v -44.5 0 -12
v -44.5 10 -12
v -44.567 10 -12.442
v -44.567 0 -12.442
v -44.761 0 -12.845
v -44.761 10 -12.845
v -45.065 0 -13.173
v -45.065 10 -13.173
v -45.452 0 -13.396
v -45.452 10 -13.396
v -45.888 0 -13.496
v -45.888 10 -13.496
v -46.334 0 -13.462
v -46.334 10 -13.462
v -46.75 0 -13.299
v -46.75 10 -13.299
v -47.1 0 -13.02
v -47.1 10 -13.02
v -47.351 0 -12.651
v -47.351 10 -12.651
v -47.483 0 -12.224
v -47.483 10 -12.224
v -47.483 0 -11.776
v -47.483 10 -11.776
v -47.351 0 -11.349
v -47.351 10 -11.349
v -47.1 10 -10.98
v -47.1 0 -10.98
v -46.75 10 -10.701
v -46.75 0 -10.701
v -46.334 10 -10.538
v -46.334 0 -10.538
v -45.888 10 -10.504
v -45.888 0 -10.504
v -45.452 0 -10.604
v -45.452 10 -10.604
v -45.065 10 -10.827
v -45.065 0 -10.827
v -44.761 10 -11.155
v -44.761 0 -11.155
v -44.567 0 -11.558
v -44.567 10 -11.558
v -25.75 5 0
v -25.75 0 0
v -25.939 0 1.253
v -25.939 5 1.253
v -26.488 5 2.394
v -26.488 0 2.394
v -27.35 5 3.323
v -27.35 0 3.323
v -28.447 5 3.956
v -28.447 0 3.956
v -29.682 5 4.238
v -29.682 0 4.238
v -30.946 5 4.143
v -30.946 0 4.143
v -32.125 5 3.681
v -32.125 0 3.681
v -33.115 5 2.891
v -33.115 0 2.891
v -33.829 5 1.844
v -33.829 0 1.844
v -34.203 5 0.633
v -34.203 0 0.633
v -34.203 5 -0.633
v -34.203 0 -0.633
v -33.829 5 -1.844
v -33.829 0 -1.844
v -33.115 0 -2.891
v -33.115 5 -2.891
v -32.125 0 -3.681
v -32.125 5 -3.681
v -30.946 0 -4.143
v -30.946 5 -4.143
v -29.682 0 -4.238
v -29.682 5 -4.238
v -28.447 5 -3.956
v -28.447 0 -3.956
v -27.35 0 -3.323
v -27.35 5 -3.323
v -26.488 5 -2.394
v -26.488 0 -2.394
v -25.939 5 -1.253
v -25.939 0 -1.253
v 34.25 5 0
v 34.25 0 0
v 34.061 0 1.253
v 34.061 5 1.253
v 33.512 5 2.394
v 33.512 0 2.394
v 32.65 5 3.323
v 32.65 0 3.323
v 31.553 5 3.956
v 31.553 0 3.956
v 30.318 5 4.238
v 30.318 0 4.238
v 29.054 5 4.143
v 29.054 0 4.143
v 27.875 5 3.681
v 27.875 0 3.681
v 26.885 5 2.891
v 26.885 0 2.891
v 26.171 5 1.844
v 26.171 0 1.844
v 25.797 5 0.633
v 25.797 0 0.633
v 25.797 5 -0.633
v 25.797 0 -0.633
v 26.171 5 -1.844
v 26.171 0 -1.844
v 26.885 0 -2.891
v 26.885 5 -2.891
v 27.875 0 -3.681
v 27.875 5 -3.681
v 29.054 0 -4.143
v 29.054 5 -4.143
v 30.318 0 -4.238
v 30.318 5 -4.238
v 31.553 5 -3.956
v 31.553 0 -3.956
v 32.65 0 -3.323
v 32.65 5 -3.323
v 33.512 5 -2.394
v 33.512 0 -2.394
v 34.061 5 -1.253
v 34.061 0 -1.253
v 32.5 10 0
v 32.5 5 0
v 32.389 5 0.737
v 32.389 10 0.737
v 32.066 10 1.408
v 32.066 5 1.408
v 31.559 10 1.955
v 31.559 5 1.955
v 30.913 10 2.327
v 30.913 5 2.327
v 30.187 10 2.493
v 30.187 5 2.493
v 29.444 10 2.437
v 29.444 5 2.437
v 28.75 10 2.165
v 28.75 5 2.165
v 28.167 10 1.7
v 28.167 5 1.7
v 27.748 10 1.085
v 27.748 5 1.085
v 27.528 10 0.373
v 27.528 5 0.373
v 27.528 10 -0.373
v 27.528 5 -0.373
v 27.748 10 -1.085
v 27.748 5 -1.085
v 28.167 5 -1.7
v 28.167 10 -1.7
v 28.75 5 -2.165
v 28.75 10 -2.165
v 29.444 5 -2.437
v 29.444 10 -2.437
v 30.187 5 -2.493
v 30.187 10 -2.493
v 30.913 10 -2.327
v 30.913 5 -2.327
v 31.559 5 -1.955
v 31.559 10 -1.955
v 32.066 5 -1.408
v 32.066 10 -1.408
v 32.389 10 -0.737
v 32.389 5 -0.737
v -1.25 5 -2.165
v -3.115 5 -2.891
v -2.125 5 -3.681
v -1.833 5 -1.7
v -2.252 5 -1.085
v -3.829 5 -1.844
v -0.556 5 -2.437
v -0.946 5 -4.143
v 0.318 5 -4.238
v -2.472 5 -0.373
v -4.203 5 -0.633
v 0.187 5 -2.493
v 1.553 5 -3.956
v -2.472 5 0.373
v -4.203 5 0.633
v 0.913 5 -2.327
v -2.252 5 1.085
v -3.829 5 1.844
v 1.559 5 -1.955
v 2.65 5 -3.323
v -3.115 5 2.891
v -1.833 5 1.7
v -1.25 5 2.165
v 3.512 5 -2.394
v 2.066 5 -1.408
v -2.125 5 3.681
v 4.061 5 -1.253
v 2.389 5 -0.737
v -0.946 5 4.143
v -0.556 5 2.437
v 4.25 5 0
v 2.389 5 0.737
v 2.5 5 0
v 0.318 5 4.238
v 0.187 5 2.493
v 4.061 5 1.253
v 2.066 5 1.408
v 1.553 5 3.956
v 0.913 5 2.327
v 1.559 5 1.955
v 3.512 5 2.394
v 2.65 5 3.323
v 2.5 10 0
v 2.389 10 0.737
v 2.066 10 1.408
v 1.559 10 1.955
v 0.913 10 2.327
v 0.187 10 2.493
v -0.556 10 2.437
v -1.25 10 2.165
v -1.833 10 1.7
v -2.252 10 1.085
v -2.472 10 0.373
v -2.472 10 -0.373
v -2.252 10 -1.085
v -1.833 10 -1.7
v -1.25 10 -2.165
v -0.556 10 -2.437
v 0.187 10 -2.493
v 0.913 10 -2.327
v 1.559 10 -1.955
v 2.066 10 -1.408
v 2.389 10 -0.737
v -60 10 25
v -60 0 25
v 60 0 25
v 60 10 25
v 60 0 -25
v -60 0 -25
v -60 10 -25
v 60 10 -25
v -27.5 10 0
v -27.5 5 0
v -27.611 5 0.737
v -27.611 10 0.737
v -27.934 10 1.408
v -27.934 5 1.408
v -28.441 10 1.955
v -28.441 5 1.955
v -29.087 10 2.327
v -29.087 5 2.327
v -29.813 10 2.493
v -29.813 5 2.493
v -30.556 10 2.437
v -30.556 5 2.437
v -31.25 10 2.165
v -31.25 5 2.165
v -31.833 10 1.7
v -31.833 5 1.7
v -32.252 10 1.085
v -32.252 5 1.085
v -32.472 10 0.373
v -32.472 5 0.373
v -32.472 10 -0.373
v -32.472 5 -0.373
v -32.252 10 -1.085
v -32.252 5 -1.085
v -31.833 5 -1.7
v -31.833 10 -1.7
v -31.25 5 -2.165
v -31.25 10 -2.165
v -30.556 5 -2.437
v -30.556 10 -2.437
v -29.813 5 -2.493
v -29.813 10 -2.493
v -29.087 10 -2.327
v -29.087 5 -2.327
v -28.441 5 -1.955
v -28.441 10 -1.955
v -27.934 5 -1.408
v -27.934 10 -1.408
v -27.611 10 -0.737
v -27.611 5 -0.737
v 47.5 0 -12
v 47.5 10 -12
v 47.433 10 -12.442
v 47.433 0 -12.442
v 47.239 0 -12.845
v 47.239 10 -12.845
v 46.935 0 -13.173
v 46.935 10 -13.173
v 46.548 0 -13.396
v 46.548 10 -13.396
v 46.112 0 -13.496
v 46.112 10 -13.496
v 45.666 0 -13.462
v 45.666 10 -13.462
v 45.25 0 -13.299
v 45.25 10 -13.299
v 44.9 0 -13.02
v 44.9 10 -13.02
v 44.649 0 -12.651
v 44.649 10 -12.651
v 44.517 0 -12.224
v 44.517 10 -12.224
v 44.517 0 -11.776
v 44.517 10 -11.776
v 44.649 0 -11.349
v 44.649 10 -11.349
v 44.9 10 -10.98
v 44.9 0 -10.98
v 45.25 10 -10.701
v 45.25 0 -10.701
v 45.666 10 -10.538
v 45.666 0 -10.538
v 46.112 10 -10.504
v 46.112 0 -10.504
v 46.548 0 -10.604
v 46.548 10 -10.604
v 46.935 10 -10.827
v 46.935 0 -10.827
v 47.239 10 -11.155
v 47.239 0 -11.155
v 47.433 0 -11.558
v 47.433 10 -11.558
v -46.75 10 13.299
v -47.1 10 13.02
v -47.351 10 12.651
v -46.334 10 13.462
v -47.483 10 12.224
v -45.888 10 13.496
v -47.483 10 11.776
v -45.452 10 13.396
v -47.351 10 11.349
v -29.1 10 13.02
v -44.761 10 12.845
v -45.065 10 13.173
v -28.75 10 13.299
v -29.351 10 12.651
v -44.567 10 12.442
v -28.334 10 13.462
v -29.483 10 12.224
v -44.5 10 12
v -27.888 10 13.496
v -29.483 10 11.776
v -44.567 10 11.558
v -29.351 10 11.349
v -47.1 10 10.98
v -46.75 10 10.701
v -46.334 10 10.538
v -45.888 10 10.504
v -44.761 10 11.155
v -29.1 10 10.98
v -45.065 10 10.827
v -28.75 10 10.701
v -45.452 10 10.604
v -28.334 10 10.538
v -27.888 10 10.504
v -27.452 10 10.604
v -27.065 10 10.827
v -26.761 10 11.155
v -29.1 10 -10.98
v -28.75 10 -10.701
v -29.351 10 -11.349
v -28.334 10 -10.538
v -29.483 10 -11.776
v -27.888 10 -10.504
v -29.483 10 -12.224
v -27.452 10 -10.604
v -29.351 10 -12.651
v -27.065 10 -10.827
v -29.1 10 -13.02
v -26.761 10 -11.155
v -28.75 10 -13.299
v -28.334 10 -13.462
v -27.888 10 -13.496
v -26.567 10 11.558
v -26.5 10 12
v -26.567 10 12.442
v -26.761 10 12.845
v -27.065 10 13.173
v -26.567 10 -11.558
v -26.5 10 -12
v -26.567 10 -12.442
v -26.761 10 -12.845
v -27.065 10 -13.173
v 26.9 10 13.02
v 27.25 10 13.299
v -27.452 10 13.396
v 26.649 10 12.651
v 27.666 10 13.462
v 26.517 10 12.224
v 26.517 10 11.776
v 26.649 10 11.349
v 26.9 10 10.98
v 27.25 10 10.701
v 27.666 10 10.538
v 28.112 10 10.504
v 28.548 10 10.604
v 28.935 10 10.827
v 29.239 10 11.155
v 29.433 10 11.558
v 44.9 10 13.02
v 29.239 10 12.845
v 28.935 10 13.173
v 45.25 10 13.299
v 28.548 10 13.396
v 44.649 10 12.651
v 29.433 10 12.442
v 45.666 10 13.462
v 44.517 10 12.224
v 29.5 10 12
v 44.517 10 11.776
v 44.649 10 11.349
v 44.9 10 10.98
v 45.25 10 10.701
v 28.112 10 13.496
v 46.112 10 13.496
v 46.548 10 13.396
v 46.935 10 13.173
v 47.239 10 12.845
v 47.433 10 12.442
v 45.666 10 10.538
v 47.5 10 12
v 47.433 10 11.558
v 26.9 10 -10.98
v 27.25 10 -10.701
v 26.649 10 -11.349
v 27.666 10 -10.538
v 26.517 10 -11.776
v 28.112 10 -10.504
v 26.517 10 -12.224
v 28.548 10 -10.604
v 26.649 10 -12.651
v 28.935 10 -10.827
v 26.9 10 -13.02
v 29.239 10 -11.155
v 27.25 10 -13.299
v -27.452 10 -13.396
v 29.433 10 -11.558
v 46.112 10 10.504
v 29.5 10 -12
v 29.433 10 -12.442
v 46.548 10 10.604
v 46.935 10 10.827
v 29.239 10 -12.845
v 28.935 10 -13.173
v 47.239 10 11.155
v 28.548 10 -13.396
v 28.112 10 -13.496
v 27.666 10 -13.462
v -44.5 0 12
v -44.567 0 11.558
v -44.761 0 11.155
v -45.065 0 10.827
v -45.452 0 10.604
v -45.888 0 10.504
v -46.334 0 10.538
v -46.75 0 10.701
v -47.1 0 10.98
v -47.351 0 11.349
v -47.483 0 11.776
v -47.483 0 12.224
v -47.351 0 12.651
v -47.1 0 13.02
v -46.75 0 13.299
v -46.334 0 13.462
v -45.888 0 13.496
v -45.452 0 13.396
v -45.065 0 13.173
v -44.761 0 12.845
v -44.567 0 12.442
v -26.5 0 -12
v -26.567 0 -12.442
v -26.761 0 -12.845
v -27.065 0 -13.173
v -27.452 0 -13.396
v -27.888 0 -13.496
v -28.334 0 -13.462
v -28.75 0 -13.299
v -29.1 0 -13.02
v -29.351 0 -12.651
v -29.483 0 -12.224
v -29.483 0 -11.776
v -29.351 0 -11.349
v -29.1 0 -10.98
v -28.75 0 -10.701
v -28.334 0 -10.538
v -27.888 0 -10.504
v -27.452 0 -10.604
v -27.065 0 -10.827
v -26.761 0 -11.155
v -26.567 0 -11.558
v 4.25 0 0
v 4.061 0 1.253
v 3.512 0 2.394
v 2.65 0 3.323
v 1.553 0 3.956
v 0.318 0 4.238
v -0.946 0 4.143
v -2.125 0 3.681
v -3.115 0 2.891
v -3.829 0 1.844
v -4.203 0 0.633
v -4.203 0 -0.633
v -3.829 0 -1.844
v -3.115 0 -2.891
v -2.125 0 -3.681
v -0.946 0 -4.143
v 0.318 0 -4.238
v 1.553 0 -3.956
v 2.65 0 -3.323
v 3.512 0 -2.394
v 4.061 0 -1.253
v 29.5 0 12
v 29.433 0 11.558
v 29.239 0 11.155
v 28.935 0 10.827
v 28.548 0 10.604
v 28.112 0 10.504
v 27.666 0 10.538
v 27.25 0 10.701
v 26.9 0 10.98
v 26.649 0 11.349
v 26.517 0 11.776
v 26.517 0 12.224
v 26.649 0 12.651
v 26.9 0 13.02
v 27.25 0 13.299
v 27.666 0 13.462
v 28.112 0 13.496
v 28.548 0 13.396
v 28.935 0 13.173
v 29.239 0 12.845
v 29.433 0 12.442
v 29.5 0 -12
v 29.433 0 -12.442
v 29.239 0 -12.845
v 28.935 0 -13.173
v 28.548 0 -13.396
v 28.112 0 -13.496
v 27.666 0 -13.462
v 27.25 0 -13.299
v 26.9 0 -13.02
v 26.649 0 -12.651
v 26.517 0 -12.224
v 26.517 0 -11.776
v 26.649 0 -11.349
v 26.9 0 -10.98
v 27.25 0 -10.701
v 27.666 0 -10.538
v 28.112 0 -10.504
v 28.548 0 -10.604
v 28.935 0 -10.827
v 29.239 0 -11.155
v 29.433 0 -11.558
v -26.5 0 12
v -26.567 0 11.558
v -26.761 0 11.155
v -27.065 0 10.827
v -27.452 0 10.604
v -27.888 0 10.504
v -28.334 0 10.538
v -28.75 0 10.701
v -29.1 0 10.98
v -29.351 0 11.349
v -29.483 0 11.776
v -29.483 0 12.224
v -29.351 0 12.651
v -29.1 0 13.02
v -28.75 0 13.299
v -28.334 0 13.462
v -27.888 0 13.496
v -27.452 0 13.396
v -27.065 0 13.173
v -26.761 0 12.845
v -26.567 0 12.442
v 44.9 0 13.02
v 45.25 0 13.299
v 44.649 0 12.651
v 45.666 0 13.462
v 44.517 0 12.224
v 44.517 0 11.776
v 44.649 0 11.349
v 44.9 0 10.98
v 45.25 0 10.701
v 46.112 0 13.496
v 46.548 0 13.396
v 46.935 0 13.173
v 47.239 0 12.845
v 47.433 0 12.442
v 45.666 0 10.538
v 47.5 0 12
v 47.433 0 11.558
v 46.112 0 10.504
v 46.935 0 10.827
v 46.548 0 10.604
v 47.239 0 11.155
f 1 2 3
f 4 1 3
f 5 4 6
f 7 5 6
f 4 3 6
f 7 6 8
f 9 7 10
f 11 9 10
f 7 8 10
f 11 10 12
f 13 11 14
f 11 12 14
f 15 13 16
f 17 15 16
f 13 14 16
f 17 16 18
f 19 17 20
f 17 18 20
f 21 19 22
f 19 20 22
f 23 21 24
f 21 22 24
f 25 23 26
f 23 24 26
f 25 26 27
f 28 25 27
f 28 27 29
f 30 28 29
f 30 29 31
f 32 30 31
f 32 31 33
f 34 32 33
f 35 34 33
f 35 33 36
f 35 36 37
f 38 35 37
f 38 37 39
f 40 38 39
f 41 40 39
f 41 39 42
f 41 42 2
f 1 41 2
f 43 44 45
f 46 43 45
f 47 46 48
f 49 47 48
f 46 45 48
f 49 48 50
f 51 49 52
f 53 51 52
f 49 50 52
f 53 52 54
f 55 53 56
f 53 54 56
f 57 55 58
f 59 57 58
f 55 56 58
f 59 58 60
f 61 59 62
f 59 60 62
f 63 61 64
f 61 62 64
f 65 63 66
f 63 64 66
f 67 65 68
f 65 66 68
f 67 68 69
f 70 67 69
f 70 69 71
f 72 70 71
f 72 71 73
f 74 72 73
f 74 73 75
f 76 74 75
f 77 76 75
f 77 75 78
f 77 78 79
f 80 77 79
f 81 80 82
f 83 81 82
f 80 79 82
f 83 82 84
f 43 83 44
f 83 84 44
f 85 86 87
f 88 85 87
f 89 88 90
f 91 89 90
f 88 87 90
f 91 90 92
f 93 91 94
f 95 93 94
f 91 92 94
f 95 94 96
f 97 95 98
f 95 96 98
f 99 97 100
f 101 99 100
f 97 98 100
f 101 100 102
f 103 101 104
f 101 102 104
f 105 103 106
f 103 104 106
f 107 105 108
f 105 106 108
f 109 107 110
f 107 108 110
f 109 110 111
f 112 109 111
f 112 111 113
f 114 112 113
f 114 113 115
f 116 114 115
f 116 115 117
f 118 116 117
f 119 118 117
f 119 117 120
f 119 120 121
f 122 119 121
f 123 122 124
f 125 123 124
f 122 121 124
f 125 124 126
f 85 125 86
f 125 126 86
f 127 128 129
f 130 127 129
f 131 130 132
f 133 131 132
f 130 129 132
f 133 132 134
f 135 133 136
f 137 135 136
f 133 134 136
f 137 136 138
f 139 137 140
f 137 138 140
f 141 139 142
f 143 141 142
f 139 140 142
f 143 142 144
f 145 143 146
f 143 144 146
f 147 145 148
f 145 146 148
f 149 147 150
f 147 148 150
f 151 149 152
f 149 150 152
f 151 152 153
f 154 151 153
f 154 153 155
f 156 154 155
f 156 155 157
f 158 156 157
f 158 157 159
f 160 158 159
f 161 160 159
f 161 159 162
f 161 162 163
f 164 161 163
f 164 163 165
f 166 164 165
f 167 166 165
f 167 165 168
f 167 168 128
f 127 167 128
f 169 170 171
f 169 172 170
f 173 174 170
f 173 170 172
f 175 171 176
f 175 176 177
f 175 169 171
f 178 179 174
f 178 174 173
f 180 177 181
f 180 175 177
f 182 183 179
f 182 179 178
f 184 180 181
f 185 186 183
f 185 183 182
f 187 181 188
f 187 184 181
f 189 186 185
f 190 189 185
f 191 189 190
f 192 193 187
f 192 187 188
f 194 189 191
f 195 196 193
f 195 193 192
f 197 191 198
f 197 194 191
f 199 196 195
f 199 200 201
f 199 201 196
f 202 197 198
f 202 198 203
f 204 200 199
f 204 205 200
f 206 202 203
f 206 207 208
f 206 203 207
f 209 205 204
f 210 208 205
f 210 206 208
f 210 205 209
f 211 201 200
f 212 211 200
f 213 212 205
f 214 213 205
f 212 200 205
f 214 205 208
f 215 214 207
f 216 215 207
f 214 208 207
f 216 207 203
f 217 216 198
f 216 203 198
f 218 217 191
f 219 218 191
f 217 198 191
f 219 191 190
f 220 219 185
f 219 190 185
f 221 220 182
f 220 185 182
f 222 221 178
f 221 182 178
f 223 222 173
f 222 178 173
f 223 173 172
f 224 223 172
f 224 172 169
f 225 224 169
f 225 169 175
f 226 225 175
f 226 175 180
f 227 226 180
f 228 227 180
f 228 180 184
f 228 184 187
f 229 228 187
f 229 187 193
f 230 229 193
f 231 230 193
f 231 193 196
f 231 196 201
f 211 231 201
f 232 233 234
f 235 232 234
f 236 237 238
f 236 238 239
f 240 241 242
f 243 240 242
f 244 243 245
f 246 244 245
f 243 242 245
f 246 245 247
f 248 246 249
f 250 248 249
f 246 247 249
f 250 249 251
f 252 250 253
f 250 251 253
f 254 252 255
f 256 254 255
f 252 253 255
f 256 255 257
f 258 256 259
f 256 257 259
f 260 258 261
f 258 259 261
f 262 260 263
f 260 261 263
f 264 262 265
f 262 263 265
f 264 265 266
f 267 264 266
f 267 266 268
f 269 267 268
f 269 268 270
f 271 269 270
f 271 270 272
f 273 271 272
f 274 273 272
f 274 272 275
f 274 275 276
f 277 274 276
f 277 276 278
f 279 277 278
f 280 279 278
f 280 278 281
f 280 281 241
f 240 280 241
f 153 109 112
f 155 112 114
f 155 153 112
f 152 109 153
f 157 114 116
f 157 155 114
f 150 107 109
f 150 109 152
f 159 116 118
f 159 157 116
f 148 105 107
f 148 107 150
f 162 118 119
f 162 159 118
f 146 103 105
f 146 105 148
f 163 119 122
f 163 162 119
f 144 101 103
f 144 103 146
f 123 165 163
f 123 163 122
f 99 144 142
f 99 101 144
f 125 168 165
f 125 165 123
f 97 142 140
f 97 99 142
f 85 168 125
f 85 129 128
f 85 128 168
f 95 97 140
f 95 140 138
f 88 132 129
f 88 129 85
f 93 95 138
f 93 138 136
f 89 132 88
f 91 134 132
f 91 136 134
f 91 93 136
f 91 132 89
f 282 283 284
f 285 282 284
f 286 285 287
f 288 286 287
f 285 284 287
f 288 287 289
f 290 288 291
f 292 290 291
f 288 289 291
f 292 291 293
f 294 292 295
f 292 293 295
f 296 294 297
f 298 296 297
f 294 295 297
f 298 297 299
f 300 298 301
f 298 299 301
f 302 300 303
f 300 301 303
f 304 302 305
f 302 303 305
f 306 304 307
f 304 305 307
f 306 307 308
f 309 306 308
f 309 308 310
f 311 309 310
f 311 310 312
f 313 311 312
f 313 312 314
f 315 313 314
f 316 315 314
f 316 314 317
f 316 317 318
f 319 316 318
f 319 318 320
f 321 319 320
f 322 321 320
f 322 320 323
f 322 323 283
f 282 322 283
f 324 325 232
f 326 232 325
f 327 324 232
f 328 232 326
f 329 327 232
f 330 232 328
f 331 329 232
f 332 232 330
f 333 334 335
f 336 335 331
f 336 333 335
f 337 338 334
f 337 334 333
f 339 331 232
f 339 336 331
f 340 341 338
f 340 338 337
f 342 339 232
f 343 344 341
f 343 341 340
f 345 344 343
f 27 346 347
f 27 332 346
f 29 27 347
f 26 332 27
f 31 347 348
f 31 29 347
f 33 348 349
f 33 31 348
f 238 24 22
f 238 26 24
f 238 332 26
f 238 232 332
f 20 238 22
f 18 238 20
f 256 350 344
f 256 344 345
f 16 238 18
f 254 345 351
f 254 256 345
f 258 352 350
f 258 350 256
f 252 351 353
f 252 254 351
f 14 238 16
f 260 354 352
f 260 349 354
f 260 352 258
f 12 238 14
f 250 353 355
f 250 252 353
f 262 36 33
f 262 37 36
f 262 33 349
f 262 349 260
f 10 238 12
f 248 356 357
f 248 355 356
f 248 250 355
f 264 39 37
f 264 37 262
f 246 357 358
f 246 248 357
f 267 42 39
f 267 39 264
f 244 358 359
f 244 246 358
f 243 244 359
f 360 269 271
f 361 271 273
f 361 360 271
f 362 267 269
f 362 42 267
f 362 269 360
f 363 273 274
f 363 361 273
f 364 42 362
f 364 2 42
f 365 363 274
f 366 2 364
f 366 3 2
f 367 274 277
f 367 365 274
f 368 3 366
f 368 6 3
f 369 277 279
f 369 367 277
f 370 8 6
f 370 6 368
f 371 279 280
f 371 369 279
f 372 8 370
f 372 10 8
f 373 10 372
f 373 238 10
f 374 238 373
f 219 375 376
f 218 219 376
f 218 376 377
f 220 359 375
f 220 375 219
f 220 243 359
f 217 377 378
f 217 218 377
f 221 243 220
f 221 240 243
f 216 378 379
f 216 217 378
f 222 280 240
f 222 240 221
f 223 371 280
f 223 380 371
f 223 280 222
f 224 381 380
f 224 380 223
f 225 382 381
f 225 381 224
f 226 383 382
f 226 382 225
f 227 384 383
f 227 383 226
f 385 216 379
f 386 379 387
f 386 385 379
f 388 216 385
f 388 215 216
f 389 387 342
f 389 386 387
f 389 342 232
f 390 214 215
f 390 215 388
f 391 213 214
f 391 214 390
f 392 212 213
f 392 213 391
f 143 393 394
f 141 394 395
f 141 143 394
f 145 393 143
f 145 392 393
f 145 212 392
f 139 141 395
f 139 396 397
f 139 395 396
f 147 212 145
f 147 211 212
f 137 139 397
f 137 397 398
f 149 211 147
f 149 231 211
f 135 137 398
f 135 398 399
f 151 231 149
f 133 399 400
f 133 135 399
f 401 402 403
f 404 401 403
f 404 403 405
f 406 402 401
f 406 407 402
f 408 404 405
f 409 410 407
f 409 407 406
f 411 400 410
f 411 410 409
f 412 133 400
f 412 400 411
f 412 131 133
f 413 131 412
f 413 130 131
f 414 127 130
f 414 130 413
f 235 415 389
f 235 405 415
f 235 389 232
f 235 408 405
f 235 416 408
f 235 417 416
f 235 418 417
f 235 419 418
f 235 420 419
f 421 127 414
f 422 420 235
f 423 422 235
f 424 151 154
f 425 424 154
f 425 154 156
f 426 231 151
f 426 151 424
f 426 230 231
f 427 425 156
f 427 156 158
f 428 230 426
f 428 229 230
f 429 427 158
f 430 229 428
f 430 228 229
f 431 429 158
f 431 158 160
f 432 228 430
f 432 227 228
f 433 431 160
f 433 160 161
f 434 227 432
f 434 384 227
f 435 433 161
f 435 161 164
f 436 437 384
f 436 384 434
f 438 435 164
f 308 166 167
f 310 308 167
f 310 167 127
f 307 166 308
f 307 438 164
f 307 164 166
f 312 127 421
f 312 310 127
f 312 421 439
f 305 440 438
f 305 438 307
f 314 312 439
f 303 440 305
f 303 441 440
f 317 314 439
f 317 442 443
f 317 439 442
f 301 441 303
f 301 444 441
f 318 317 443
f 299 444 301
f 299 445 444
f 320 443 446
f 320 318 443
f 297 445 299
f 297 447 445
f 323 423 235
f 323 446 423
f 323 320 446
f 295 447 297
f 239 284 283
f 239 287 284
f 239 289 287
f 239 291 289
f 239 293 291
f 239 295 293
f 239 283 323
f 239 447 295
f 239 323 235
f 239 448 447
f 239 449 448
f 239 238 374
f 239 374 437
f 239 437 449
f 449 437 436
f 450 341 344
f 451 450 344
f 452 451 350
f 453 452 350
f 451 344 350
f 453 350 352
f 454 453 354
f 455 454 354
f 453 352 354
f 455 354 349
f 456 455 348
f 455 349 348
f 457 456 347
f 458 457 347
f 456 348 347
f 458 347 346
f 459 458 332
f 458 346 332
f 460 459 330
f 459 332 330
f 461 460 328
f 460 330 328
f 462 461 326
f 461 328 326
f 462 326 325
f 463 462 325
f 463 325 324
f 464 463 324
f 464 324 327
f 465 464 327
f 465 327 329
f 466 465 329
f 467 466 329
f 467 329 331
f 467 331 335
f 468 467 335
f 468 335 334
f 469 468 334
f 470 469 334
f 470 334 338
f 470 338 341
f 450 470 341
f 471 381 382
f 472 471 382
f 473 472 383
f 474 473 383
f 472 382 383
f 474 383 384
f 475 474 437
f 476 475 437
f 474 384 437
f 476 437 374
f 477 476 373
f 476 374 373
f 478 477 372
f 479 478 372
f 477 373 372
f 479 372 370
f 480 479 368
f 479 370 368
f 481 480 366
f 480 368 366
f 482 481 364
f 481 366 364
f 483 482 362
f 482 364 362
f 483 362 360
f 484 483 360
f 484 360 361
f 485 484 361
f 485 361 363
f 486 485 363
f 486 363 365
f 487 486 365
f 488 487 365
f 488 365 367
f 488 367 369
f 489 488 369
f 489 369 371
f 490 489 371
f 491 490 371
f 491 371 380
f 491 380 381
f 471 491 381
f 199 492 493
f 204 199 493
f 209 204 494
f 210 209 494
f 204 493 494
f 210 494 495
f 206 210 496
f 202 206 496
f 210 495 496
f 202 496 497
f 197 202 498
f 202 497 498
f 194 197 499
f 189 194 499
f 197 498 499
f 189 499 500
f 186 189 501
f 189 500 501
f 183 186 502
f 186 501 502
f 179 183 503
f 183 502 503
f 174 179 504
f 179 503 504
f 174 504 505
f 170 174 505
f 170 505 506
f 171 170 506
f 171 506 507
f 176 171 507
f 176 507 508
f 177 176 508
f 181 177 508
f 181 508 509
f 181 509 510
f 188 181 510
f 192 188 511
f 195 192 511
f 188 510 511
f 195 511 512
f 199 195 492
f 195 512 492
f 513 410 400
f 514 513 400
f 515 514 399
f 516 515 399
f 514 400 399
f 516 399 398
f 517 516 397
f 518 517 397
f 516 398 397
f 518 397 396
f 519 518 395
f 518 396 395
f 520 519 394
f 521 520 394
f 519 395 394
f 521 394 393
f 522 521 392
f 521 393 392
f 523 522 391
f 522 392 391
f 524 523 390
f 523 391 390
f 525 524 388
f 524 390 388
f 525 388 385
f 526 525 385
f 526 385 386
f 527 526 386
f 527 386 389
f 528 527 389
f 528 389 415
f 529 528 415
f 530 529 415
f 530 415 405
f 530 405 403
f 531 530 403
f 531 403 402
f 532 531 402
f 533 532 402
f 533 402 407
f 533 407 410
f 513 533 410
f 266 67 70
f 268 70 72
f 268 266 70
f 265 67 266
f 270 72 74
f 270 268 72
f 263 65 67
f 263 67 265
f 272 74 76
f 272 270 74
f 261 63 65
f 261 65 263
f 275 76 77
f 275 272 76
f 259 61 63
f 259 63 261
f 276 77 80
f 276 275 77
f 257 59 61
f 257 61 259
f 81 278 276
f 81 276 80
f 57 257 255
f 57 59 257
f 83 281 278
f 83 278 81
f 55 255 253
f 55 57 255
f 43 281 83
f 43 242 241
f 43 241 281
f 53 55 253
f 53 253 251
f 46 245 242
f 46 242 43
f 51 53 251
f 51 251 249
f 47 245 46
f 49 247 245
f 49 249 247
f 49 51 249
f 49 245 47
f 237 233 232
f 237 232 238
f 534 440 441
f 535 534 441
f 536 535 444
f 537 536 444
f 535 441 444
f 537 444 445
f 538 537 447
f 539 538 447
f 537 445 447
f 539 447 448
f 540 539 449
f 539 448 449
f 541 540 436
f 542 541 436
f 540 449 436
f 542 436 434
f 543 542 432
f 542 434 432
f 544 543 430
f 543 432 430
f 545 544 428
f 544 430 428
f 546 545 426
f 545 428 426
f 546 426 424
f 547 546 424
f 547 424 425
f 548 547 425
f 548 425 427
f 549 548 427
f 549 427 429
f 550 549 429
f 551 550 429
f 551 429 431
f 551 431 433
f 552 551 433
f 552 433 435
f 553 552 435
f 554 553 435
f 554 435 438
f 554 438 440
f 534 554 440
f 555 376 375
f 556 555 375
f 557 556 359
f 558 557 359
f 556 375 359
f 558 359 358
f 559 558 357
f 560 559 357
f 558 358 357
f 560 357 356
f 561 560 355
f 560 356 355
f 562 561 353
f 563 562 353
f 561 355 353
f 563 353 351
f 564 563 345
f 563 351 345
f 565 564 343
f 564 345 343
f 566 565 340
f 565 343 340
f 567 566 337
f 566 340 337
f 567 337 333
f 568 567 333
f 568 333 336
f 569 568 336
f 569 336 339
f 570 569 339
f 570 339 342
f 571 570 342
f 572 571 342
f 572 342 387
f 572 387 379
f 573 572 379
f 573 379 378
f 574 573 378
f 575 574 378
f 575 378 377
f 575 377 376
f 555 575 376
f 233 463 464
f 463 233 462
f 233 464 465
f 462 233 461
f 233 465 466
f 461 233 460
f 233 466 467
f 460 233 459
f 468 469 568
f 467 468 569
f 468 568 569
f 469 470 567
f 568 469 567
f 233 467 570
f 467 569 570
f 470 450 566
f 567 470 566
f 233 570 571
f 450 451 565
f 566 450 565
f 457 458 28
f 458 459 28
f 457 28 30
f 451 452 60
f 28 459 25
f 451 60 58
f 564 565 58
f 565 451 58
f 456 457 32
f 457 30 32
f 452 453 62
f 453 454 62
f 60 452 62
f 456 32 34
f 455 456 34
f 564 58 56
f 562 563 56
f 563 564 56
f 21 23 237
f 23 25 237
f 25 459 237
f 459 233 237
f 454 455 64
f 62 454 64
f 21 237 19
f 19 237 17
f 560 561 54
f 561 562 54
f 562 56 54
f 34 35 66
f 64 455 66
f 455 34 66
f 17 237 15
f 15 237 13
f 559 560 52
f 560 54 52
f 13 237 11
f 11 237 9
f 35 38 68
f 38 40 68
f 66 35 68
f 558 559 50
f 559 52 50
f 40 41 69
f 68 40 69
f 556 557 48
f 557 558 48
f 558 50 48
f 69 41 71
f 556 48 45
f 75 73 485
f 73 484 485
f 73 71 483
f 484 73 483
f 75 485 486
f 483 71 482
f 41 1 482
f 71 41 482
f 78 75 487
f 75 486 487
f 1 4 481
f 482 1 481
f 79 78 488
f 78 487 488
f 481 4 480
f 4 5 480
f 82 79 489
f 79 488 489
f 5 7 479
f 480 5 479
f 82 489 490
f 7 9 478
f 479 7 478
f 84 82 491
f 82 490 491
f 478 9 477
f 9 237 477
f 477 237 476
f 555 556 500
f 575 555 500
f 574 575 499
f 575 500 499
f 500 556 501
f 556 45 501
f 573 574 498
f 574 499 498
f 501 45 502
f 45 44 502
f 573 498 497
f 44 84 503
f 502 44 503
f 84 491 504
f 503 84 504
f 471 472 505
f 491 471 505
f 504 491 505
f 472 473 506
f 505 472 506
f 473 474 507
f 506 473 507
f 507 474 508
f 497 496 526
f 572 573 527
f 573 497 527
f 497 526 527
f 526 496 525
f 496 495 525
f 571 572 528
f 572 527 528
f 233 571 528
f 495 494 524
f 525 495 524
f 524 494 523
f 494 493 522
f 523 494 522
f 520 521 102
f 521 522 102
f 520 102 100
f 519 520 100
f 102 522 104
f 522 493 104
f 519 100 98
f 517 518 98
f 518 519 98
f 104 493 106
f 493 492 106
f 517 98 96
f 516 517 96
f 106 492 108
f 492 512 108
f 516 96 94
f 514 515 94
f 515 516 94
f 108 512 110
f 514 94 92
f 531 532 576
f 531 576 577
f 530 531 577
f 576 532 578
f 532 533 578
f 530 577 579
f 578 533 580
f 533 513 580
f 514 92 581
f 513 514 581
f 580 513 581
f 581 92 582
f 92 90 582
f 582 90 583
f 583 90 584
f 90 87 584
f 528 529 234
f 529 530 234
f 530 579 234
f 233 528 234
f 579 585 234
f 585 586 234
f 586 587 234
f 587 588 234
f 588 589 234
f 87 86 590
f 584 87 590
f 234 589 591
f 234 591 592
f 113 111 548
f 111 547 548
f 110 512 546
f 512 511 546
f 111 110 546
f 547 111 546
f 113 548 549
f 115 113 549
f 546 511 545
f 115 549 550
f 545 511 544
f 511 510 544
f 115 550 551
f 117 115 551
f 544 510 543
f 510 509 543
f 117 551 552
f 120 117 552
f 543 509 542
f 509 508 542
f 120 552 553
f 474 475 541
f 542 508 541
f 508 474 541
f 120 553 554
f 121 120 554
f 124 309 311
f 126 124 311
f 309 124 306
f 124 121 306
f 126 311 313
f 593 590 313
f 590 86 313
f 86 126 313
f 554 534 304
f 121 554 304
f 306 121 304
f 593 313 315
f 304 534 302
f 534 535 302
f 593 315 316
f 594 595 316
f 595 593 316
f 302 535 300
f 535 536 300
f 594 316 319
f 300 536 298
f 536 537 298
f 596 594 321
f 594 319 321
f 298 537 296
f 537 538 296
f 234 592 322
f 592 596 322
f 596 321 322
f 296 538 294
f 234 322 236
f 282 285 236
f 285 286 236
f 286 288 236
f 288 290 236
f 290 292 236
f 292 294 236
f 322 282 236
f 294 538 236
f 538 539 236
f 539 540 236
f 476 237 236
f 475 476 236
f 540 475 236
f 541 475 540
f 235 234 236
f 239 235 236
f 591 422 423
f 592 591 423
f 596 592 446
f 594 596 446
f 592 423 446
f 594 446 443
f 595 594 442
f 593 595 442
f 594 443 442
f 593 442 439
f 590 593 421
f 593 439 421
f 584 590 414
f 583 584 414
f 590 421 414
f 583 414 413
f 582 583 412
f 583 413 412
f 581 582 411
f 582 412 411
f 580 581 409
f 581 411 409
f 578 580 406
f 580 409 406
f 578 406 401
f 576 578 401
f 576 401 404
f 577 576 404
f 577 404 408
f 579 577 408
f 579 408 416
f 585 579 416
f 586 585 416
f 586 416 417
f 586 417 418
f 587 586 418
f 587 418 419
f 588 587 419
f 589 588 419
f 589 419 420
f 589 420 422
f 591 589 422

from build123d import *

# Parameters (mm, degrees)
SKETCH1_W           = 120
SKETCH1_H           = 50
BOSS_EXTRUDE1_DEPTH = 10
SKETCH2_R           = 1.5
CUT_EXTRUDE1_DEPTH  = 11
SKETCH3_R           = 2.5
CUT_EXTRUDE2_DEPTH  = 11
SKETCH4_R           = 4.25
CUT_EXTRUDE3_DEPTH  = 5


with BuildPart() as part:
    # Sketch1 → Boss-Extrude1 (new body)
    with BuildSketch(Plane(origin=(0, 0, 0), x_dir=(1, 0, 0), z_dir=(0, 1, 0))):
        Rectangle(SKETCH1_W, SKETCH1_H)
    extrude(amount=BOSS_EXTRUDE1_DEPTH)

    # Sketch2 → Cut-Extrude1 (cut, through all)
    with BuildSketch(Plane(origin=(0, 10, 0), x_dir=(1, 0, 0), z_dir=(0, 1, 0))):
        with Locations((28, -12)):
            Circle(SKETCH2_R)
        with Locations((28, 12)):
            Circle(SKETCH2_R)
        with Locations((46, -12)):
            Circle(SKETCH2_R)
        with Locations((46, 12)):
            Circle(SKETCH2_R)
        with Locations((-46, -12)):
            Circle(SKETCH2_R)
        with Locations((-46, 12)):
            Circle(SKETCH2_R)
        with Locations((-28, -12)):
            Circle(SKETCH2_R)
        with Locations((-28, 12)):
            Circle(SKETCH2_R)
    extrude(amount=-CUT_EXTRUDE1_DEPTH, mode=Mode.SUBTRACT)

    # Sketch3 → Cut-Extrude2 (cut, through all)
    with BuildSketch(Plane.XZ):
        Circle(SKETCH3_R)
        with Locations((30, 0)):
            Circle(SKETCH3_R)
        with Locations((-30, 0)):
            Circle(SKETCH3_R)
    extrude(amount=-CUT_EXTRUDE2_DEPTH, mode=Mode.SUBTRACT)

    # Sketch4 → Cut-Extrude3 (cut)
    with BuildSketch(Plane.XZ):
        with Locations((30, 0)):
            Circle(SKETCH4_R)
        Circle(SKETCH4_R)
        with Locations((-30, 0)):
            Circle(SKETCH4_R)
    extrude(amount=-CUT_EXTRUDE3_DEPTH, mode=Mode.SUBTRACT)


solid = part.part
